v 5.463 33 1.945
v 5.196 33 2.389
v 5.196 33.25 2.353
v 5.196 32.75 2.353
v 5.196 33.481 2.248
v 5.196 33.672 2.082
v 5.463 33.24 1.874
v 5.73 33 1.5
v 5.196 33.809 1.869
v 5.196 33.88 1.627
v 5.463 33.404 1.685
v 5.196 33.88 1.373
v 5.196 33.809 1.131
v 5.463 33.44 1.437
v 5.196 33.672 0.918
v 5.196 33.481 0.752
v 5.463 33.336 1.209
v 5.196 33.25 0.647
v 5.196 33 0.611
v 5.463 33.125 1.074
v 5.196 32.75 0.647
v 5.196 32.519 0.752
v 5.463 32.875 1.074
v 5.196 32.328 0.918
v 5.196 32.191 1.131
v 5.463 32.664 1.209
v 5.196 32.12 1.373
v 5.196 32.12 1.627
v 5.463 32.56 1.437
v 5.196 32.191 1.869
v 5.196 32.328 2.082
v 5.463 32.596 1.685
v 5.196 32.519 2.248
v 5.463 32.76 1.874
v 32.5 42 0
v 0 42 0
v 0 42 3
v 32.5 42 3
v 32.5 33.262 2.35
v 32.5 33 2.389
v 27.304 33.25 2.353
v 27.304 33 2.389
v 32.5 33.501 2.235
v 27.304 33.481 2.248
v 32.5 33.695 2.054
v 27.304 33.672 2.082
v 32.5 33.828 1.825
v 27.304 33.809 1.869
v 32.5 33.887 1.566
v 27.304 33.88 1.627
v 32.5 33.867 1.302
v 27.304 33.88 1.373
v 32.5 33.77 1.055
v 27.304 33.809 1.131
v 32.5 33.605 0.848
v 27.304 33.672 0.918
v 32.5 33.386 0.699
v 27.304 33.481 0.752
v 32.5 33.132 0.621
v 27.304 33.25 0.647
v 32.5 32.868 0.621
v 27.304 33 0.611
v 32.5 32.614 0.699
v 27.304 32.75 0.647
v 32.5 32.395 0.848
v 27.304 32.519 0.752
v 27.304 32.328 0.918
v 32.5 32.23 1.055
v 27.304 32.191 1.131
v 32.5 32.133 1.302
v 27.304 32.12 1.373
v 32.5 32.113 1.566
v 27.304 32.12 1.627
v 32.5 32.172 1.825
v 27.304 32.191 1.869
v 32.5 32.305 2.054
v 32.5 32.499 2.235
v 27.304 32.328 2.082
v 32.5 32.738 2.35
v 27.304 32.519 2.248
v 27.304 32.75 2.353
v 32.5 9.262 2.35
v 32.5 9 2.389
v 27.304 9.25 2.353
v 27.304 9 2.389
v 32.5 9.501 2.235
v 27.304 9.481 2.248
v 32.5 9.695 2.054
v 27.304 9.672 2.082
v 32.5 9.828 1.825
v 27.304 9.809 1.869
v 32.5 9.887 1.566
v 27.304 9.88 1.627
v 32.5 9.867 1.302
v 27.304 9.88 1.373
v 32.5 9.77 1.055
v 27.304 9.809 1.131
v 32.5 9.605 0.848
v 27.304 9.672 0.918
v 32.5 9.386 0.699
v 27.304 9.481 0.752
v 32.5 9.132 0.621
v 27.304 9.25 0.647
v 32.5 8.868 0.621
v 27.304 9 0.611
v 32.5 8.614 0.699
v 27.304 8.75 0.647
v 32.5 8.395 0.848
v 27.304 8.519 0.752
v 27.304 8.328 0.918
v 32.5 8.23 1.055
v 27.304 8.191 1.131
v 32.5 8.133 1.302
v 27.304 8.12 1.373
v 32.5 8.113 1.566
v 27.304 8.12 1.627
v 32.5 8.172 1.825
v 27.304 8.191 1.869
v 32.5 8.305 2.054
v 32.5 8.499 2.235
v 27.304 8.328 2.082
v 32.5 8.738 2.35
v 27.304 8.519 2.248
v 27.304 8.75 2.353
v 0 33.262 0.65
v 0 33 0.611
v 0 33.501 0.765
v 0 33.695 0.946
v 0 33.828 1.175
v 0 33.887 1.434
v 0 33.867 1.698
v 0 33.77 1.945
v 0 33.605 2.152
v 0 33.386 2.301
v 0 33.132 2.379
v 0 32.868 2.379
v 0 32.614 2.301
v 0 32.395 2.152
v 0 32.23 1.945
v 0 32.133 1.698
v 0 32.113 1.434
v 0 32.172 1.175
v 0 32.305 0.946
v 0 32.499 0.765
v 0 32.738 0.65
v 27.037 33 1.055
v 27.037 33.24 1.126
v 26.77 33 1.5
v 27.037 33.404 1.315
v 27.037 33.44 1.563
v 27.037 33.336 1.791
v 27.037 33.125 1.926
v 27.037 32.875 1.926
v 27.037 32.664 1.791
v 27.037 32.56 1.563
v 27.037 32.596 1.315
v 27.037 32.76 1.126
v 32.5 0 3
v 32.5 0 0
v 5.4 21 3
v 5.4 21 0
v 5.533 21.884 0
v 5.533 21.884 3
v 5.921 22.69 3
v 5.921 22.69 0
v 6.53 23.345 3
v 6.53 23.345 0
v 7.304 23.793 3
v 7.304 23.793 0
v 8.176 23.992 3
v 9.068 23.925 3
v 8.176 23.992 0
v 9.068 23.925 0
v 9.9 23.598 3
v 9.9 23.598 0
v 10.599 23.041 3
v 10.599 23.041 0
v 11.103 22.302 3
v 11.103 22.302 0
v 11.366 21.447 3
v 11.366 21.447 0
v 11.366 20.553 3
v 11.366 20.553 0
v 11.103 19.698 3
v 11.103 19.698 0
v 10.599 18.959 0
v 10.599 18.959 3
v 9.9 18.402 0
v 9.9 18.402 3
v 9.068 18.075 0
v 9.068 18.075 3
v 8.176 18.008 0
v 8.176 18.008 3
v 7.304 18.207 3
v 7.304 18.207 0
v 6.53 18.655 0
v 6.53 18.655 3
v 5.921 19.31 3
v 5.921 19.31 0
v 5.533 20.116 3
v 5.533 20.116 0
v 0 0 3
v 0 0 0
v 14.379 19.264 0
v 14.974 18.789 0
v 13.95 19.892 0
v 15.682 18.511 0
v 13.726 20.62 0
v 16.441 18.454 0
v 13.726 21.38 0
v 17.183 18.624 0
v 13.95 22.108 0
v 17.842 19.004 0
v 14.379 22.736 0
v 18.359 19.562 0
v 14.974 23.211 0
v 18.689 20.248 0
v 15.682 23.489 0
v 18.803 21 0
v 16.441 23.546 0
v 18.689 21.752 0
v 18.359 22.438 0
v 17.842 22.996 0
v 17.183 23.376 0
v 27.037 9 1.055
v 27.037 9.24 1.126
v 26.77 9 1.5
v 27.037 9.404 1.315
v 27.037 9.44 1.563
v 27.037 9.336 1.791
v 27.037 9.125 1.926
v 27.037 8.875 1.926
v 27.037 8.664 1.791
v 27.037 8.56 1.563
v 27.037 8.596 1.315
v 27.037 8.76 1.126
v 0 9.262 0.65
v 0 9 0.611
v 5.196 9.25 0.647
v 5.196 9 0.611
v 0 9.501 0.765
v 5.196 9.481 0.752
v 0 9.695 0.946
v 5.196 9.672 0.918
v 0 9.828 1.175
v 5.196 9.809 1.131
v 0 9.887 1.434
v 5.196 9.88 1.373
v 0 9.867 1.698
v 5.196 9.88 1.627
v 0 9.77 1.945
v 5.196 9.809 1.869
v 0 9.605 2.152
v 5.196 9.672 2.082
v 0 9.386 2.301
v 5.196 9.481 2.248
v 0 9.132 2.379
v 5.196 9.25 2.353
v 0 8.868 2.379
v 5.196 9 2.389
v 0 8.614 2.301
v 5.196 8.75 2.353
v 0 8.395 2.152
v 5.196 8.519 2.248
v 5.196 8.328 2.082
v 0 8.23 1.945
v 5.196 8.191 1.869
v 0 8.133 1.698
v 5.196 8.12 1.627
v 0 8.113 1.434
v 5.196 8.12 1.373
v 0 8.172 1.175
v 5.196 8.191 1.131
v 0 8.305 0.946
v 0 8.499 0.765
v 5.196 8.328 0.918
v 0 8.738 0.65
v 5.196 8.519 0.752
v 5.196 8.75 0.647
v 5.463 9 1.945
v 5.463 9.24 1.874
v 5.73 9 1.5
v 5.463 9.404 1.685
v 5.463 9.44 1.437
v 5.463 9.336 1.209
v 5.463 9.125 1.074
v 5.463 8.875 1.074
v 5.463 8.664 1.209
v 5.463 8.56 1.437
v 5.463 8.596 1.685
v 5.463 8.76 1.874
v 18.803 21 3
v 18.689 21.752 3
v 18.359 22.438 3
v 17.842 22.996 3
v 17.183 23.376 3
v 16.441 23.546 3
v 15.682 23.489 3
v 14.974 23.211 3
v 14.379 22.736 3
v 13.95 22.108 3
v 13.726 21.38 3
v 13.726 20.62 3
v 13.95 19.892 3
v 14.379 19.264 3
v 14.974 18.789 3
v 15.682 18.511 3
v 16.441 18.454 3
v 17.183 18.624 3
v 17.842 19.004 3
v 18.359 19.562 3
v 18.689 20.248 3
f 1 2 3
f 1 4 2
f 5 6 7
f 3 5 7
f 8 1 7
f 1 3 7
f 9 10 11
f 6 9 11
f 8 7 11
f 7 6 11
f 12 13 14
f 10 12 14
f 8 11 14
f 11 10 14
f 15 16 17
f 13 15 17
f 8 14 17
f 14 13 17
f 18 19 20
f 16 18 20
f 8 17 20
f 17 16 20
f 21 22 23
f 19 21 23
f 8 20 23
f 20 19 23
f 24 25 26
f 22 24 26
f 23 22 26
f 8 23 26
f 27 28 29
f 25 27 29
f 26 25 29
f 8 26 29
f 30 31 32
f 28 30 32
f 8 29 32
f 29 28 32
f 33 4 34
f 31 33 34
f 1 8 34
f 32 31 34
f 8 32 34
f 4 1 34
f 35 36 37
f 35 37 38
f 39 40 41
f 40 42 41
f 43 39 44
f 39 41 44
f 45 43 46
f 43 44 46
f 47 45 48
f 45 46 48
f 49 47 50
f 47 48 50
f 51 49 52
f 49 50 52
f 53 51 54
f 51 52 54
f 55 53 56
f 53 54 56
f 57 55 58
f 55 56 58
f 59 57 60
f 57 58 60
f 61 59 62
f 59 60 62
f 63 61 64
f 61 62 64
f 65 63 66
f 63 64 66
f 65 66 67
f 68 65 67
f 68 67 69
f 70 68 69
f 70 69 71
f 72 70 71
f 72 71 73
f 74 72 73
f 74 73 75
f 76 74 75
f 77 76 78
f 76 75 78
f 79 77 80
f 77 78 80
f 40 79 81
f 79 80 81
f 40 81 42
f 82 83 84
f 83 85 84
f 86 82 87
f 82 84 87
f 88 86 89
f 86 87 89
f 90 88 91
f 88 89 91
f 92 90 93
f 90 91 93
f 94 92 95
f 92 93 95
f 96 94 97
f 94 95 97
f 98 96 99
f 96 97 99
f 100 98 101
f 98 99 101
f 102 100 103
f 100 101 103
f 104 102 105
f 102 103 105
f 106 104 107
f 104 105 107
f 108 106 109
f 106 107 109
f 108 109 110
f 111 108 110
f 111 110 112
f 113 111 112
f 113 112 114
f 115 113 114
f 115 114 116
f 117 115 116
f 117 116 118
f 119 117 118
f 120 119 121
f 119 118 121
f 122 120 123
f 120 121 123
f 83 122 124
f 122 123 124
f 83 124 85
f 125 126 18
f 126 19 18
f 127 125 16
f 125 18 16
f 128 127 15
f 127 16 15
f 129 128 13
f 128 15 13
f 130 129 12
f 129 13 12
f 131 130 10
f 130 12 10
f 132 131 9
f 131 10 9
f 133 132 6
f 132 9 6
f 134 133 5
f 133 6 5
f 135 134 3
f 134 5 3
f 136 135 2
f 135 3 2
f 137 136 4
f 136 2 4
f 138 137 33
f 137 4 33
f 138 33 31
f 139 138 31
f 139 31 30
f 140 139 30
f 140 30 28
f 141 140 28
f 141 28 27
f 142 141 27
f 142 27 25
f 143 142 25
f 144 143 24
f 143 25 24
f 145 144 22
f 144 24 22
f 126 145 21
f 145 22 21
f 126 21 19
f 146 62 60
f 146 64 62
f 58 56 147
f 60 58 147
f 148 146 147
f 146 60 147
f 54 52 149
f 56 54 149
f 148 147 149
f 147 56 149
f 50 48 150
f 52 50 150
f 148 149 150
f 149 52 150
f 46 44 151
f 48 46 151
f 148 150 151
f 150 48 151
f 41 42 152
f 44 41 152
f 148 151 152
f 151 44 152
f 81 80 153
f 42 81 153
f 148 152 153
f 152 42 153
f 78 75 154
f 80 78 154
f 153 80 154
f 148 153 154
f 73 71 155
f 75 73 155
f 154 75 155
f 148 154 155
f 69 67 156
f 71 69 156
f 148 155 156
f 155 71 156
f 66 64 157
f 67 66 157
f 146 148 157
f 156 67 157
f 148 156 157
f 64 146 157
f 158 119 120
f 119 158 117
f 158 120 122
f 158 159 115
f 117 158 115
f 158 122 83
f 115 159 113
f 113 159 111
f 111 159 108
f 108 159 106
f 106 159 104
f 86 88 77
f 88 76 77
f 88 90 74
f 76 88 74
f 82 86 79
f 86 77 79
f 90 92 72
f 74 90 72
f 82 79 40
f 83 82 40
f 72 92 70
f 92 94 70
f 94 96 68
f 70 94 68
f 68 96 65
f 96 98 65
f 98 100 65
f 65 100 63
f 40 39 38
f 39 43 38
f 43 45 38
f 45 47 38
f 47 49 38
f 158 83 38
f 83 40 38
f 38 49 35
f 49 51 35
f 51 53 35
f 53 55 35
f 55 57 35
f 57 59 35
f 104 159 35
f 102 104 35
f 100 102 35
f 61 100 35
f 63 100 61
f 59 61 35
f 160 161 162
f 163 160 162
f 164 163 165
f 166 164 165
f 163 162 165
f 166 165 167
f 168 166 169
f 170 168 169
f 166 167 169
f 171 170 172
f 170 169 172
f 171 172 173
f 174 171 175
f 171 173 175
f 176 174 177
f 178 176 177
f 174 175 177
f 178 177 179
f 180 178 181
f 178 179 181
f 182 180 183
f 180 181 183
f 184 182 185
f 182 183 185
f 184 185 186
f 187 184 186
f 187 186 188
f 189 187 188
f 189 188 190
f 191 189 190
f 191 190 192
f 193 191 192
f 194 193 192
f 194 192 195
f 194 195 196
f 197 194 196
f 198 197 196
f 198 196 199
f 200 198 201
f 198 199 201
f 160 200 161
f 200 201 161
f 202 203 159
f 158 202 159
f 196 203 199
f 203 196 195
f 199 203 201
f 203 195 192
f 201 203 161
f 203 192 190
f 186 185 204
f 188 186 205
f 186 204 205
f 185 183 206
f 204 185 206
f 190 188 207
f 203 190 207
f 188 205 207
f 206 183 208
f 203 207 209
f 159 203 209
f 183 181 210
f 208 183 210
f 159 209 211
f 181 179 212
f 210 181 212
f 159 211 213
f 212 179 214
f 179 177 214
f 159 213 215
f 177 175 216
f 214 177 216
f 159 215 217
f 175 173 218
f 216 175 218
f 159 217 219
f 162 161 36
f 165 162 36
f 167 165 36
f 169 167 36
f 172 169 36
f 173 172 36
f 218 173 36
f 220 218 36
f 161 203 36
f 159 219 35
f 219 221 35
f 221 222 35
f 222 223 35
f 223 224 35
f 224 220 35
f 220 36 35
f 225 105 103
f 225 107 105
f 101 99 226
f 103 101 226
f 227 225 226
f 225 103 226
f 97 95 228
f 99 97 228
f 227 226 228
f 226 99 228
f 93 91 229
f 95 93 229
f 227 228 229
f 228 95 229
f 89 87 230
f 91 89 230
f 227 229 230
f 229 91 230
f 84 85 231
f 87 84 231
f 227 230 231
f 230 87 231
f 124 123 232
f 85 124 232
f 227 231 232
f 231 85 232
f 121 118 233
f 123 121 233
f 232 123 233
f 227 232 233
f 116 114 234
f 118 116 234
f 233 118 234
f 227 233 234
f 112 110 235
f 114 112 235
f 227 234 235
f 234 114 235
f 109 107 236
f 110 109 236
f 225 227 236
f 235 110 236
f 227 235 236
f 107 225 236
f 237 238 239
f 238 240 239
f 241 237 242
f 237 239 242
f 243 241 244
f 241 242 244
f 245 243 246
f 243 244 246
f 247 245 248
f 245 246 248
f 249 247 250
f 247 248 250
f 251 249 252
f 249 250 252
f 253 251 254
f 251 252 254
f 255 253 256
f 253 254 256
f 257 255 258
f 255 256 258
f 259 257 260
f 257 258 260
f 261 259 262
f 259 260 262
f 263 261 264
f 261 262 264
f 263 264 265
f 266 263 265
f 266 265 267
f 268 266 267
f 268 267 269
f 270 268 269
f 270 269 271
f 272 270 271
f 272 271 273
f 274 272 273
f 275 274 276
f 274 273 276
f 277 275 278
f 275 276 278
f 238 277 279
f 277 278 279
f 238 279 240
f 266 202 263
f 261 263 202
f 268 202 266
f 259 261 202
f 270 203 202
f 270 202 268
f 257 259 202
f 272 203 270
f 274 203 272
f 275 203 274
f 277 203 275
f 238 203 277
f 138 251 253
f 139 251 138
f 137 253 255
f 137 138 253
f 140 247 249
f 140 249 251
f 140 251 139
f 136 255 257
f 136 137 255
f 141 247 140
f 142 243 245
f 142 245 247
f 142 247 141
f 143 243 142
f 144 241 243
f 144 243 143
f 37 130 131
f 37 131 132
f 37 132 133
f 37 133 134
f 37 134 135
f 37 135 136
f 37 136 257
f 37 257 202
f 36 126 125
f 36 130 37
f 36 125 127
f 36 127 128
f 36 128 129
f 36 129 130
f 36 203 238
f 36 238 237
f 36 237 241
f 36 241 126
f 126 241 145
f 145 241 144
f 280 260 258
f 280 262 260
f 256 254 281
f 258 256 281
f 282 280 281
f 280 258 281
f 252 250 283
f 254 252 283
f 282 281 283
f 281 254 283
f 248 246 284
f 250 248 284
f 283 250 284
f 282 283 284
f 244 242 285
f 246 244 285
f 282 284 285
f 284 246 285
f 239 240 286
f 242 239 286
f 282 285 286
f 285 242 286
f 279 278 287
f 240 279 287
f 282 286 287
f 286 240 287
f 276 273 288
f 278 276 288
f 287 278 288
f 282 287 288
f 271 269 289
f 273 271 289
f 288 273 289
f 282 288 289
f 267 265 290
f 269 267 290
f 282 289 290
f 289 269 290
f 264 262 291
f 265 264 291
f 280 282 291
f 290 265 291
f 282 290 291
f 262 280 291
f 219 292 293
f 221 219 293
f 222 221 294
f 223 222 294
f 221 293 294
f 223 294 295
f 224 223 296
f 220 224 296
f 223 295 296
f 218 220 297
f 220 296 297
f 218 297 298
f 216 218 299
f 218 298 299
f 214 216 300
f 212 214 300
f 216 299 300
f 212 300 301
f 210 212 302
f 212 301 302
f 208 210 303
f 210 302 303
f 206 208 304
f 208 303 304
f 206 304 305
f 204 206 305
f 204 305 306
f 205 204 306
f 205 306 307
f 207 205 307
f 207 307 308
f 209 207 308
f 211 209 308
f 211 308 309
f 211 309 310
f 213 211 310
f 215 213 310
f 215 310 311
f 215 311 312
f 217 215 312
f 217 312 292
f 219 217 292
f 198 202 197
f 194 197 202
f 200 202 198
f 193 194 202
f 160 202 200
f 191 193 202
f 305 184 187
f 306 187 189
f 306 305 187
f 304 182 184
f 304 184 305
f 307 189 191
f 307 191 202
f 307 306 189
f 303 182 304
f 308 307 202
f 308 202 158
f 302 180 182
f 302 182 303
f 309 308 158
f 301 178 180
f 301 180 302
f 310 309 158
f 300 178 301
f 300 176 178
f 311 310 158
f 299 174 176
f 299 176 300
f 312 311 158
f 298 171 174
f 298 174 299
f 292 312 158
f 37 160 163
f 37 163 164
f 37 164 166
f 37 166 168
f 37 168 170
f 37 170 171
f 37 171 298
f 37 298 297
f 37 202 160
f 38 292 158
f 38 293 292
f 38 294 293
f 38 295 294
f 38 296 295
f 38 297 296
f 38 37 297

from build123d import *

# Parameters (mm, degrees)
SKETCH1_W                 = 32.5
SKETCH1_H                 = 42
BOSS_EXTRUDE2_DEPTH       = 3
F_2_56_TAPPED_HOLE1_D     = 1.778
F_2_56_TAPPED_HOLE1_DEPTH = 5.19583491
F_2_56_TAPPED_HOLE1_TIP   = 0.53416509
F_2_56_TAPPED_HOLE2_D     = 1.778
F_2_56_TAPPED_HOLE2_DEPTH = 5.19583491
F_2_56_TAPPED_HOLE2_TIP   = 0.53416509
CUT_EXTRUDE1_DEPTH        = 3
F_1_4_20_TAPPED_HOLE1_D   = 5.1054


with BuildPart() as part:
    # Sketch1 → Boss-Extrude2 (new body)
    with BuildSketch(Plane.XY):
        with Locations((16.25, 21)):
            Rectangle(SKETCH1_W, SKETCH1_H)
    extrude(amount=BOSS_EXTRUDE2_DEPTH)

    # #2-56 Tapped Hole1
    with Locations(Plane.ZY):
        with Locations((1.5, 33), (1.5, 9)):
            Hole(F_2_56_TAPPED_HOLE1_D / 2, depth=F_2_56_TAPPED_HOLE1_DEPTH)
            with Locations((0, 0, -(F_2_56_TAPPED_HOLE1_DEPTH + F_2_56_TAPPED_HOLE1_TIP / 2))):  # 118° drill point
                Cone(0, F_2_56_TAPPED_HOLE1_D / 2, F_2_56_TAPPED_HOLE1_TIP, mode=Mode.SUBTRACT)

    # #2-56 Tapped Hole2
    with Locations(Plane(origin=(32.5, 0, 0), x_dir=(0, 0, -1), z_dir=(1, 0, 0))):
        with Locations((-1.5, 33), (-1.5, 9)):
            Hole(F_2_56_TAPPED_HOLE2_D / 2, depth=F_2_56_TAPPED_HOLE2_DEPTH)
            with Locations((0, 0, -(F_2_56_TAPPED_HOLE2_DEPTH + F_2_56_TAPPED_HOLE2_TIP / 2))):  # 118° drill point
                Cone(0, F_2_56_TAPPED_HOLE2_D / 2, F_2_56_TAPPED_HOLE2_TIP, mode=Mode.SUBTRACT)

    # Sketch9 → Cut-Extrude1 (cut)
    with BuildSketch(Plane(origin=(0, 0, 0), x_dir=(-1, 0, 0), z_dir=(0, 0, -1))):
        with BuildLine():
            ThreePointArc((-11.4, 21), (-8.4, 18), (-5.4, 21))
            Line((-5.4, 21), (-8.4, 21))
            Line((-8.4, 21), (-11.4, 21))
        make_face()
        with BuildLine():
            Line((-8.4, 21), (-5.4, 21))
            ThreePointArc((-5.4, 21), (-8.4, 24), (-11.4, 21))
            Line((-11.4, 21), (-8.4, 21))
        make_face()
    extrude(amount=-CUT_EXTRUDE1_DEPTH, mode=Mode.SUBTRACT)

    # 1/4-20 Tapped Hole1 (through all)
    with Locations(Plane(origin=(0, 0, 0), x_dir=(-1, 0, 0), z_dir=(0, 0, -1))):
        with Locations((-16.25, 21)):
            Hole(F_1_4_20_TAPPED_HOLE1_D / 2)


solid = part.part
